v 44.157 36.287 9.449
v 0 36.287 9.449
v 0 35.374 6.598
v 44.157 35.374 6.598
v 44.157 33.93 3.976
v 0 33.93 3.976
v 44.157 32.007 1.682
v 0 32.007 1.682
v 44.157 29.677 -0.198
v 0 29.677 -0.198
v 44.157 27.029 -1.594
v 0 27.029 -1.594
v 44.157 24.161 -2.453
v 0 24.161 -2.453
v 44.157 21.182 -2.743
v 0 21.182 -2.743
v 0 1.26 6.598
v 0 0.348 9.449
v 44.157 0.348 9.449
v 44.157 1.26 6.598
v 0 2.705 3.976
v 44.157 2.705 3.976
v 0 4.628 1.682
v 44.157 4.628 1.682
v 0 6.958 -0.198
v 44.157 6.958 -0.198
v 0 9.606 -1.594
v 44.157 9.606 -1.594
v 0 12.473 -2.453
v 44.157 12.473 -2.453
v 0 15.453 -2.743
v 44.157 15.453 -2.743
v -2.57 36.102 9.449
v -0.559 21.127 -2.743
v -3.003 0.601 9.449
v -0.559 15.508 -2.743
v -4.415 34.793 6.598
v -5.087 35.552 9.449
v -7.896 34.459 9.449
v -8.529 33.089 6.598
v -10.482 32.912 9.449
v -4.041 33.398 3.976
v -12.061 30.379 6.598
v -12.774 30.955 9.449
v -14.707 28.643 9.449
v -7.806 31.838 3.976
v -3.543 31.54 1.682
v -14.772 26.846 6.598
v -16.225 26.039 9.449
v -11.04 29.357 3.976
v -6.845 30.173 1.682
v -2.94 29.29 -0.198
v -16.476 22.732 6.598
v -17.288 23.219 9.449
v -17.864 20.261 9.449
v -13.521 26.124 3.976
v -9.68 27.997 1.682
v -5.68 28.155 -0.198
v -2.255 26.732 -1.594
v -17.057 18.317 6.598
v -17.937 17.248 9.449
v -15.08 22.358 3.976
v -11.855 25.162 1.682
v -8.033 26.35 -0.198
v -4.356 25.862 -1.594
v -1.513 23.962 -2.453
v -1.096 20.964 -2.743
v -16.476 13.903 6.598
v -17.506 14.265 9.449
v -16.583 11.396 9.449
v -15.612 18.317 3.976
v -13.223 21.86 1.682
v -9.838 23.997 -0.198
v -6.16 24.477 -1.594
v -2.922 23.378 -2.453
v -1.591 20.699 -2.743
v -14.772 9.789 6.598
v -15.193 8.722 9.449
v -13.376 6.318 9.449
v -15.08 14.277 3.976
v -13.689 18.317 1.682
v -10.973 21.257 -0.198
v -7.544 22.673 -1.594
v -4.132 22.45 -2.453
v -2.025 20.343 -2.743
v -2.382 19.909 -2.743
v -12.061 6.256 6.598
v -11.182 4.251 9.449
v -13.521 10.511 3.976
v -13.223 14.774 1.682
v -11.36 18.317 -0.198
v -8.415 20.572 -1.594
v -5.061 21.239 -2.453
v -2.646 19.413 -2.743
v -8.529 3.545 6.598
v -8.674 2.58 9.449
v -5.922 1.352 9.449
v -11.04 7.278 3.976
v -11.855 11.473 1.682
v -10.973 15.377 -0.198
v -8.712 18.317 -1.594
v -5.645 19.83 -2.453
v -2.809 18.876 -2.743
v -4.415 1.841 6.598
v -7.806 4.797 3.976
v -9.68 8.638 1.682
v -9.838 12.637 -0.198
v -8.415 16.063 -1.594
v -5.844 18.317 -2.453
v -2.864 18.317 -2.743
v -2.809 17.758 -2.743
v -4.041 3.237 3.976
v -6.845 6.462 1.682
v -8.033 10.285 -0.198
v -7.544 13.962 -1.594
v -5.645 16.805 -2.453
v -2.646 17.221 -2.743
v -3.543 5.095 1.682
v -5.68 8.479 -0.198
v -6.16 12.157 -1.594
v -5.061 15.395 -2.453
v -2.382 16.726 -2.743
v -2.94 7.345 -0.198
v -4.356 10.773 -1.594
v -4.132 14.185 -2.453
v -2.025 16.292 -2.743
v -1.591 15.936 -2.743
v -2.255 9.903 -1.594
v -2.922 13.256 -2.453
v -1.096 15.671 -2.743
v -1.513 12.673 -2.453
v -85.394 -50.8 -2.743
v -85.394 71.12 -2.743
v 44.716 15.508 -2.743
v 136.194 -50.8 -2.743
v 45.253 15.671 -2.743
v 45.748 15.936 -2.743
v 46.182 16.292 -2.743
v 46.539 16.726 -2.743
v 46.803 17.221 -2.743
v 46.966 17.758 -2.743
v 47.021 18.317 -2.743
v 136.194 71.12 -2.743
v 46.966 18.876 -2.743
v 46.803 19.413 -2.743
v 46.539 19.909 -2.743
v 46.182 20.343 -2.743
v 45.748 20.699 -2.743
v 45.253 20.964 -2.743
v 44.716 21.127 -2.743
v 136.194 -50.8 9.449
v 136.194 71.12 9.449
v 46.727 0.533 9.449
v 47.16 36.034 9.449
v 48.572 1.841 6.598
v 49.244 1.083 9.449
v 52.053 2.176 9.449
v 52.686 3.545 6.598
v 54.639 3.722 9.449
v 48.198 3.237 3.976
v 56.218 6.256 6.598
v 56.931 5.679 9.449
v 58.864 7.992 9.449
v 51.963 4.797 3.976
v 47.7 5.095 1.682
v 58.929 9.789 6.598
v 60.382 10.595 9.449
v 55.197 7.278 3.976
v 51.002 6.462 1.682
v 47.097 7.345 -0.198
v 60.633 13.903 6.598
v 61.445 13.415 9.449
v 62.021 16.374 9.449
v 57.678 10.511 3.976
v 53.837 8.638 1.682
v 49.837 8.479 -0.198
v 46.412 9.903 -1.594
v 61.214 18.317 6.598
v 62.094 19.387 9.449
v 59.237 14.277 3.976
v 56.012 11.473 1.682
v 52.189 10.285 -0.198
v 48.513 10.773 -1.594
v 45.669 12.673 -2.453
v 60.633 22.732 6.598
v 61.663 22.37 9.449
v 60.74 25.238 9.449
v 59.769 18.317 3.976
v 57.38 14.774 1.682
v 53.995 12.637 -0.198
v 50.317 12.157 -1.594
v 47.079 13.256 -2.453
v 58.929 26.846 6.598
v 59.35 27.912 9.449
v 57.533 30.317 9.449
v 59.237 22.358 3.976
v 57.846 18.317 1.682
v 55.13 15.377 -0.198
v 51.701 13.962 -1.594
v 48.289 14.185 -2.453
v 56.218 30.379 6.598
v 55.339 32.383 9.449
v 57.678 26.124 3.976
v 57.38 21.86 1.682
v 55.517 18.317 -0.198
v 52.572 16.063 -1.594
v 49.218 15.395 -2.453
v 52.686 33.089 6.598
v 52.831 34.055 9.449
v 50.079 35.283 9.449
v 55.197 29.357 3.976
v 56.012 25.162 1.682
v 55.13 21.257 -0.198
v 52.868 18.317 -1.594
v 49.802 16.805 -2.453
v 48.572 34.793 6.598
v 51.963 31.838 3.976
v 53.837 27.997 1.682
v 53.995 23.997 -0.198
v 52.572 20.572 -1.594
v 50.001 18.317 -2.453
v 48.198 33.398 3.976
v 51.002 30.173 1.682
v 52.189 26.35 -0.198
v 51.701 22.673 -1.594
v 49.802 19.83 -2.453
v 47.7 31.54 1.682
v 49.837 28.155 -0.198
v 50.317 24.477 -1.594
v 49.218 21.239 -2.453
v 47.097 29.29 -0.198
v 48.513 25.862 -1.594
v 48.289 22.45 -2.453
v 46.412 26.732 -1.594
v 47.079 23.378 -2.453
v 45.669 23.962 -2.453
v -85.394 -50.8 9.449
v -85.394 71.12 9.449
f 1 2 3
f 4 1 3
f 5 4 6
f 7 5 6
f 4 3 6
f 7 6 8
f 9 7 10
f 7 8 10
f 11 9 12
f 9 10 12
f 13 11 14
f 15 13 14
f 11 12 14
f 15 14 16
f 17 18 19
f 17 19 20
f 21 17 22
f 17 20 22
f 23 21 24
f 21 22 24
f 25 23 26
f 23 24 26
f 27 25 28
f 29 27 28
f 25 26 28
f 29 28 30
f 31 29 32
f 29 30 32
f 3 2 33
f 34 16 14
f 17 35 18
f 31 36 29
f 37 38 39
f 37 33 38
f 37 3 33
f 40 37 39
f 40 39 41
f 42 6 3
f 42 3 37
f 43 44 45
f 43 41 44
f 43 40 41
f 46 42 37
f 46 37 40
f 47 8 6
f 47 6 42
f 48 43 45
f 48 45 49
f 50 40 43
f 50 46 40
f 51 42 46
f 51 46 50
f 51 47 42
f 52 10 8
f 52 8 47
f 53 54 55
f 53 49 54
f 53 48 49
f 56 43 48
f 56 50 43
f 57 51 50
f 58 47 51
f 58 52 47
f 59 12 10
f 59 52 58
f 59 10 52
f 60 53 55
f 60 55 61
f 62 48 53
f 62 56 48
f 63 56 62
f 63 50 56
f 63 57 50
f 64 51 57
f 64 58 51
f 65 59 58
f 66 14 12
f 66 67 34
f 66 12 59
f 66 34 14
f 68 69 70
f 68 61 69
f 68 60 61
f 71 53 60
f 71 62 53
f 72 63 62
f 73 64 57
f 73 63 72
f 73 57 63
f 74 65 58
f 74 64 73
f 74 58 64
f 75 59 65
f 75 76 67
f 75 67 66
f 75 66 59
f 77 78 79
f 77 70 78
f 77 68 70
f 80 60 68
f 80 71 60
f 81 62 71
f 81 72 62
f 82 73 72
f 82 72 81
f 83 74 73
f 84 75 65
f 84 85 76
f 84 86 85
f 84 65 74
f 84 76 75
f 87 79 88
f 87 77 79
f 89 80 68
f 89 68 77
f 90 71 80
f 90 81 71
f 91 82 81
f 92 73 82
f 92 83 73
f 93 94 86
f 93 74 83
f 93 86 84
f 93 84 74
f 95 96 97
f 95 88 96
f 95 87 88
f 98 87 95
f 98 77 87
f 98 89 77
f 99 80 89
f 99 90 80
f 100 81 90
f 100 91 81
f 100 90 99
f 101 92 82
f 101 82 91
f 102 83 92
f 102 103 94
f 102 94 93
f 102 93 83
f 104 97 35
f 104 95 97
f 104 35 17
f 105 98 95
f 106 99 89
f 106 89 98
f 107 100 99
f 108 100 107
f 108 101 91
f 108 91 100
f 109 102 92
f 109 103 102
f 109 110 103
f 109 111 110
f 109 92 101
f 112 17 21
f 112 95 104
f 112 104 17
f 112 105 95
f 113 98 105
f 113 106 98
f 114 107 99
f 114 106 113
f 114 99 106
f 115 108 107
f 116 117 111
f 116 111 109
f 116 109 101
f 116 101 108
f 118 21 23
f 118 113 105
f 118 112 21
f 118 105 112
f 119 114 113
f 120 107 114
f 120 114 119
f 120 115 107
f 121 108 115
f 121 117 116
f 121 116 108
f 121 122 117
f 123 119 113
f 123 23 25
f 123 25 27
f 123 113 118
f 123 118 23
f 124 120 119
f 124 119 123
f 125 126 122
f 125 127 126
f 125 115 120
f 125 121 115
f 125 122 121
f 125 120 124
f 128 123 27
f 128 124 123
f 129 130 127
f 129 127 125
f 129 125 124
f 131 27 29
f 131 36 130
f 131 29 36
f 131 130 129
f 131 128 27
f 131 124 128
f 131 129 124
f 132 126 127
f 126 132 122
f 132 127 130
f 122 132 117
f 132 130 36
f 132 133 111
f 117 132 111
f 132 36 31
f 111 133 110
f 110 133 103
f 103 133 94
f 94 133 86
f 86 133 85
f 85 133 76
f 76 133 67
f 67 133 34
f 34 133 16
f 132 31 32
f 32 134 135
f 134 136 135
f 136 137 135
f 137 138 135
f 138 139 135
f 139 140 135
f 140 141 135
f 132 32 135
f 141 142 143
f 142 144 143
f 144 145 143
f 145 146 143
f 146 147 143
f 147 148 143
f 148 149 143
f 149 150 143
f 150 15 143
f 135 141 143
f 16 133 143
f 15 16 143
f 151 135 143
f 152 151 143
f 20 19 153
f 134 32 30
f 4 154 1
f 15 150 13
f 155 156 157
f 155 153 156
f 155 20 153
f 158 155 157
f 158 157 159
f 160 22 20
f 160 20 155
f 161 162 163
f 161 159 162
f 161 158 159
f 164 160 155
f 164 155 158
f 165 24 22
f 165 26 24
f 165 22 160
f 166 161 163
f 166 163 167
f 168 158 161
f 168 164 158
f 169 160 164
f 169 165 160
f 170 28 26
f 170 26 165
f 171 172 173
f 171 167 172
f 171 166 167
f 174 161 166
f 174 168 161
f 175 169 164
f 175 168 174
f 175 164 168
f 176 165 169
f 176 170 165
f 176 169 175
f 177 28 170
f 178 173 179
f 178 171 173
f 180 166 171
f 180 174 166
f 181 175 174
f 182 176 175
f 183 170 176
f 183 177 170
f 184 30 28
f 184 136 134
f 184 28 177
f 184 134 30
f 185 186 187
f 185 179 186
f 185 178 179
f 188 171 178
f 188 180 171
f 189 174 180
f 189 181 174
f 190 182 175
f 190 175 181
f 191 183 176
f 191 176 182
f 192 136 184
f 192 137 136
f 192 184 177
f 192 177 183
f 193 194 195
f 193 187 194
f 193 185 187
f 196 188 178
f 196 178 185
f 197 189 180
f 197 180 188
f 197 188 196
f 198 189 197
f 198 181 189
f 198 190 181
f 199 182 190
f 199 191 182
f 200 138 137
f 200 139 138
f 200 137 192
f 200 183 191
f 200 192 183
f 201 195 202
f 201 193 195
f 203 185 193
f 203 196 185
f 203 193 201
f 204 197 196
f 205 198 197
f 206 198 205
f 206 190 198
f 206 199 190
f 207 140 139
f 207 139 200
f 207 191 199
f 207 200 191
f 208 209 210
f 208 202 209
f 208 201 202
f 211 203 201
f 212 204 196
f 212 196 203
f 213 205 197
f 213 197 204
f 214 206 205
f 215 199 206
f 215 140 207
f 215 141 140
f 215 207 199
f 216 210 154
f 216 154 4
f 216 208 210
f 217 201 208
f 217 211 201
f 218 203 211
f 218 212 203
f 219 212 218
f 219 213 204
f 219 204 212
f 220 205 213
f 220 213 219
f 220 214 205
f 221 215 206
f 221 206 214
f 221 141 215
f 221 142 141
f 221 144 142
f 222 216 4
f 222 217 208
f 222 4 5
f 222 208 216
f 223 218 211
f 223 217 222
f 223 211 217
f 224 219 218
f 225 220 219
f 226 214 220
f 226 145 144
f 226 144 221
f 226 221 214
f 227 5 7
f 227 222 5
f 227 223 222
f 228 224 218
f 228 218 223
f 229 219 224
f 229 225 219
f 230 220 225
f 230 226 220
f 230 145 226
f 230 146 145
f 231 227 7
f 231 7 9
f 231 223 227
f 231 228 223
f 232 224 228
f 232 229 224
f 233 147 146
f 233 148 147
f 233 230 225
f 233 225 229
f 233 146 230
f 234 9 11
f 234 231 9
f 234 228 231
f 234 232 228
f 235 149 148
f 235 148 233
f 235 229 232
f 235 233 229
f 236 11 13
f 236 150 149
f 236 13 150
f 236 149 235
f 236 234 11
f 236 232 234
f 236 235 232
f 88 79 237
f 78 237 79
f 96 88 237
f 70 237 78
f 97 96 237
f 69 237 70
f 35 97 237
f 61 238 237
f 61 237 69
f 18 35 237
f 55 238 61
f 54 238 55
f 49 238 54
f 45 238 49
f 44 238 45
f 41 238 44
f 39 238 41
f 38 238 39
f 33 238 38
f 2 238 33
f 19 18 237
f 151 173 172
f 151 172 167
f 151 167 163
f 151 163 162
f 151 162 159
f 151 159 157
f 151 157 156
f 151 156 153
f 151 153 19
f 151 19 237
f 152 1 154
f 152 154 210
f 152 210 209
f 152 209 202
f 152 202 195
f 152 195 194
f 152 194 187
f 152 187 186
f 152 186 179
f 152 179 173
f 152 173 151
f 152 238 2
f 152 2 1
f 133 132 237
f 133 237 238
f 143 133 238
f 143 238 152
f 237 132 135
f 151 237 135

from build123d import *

# Parameters (mm, degrees)
F1_DEPTH = 15.5448
F2_R     = 15.452898
F3_W     = 221.588438
F3_H     = 121.92
F4_DEPTH = 12.192


with BuildPart() as f1:
    # F0 (on Top) → F1 (new body)
    with BuildSketch(Plane.XY):
        with BuildLine():
            ThreePointArc((0, 36.634617), (-18.317308, 18.317308), (0, 0))
            Line((0, 0), (44.156924, 0))
            ThreePointArc((44.156924, 0), (62.474232, 18.317308), (44.156924, 36.634617))
            Line((44.156924, 36.634617), (0, 36.634617))
        make_face()
    extrude(amount=F1_DEPTH)

    # F2
    f2_edges = [f1.edges().sort_by_distance(p)[0] for p in [
        (22.078462, 36.634617, 0),
        (62.474232, 18.317308, 0),
        (-18.317308, 18.317308, 0),
    ]]
    fillet(f2_edges, radius=F2_R)


with BuildPart() as f4:
    # F3 (on Top) → F4 (new body)
    with BuildSketch(Plane.XY):
        with Locations((25.399999, 10.16)):
            Rectangle(F3_W, F3_H)
    extrude(amount=F4_DEPTH)

    # F5: cut F1
    add(f1.part, mode=Mode.SUBTRACT)


with BuildPart() as f4_1:
    # F6: moved
    add(f4.part.moved(Location((0, 0, -2.7432))))


solid = f4_1.part
